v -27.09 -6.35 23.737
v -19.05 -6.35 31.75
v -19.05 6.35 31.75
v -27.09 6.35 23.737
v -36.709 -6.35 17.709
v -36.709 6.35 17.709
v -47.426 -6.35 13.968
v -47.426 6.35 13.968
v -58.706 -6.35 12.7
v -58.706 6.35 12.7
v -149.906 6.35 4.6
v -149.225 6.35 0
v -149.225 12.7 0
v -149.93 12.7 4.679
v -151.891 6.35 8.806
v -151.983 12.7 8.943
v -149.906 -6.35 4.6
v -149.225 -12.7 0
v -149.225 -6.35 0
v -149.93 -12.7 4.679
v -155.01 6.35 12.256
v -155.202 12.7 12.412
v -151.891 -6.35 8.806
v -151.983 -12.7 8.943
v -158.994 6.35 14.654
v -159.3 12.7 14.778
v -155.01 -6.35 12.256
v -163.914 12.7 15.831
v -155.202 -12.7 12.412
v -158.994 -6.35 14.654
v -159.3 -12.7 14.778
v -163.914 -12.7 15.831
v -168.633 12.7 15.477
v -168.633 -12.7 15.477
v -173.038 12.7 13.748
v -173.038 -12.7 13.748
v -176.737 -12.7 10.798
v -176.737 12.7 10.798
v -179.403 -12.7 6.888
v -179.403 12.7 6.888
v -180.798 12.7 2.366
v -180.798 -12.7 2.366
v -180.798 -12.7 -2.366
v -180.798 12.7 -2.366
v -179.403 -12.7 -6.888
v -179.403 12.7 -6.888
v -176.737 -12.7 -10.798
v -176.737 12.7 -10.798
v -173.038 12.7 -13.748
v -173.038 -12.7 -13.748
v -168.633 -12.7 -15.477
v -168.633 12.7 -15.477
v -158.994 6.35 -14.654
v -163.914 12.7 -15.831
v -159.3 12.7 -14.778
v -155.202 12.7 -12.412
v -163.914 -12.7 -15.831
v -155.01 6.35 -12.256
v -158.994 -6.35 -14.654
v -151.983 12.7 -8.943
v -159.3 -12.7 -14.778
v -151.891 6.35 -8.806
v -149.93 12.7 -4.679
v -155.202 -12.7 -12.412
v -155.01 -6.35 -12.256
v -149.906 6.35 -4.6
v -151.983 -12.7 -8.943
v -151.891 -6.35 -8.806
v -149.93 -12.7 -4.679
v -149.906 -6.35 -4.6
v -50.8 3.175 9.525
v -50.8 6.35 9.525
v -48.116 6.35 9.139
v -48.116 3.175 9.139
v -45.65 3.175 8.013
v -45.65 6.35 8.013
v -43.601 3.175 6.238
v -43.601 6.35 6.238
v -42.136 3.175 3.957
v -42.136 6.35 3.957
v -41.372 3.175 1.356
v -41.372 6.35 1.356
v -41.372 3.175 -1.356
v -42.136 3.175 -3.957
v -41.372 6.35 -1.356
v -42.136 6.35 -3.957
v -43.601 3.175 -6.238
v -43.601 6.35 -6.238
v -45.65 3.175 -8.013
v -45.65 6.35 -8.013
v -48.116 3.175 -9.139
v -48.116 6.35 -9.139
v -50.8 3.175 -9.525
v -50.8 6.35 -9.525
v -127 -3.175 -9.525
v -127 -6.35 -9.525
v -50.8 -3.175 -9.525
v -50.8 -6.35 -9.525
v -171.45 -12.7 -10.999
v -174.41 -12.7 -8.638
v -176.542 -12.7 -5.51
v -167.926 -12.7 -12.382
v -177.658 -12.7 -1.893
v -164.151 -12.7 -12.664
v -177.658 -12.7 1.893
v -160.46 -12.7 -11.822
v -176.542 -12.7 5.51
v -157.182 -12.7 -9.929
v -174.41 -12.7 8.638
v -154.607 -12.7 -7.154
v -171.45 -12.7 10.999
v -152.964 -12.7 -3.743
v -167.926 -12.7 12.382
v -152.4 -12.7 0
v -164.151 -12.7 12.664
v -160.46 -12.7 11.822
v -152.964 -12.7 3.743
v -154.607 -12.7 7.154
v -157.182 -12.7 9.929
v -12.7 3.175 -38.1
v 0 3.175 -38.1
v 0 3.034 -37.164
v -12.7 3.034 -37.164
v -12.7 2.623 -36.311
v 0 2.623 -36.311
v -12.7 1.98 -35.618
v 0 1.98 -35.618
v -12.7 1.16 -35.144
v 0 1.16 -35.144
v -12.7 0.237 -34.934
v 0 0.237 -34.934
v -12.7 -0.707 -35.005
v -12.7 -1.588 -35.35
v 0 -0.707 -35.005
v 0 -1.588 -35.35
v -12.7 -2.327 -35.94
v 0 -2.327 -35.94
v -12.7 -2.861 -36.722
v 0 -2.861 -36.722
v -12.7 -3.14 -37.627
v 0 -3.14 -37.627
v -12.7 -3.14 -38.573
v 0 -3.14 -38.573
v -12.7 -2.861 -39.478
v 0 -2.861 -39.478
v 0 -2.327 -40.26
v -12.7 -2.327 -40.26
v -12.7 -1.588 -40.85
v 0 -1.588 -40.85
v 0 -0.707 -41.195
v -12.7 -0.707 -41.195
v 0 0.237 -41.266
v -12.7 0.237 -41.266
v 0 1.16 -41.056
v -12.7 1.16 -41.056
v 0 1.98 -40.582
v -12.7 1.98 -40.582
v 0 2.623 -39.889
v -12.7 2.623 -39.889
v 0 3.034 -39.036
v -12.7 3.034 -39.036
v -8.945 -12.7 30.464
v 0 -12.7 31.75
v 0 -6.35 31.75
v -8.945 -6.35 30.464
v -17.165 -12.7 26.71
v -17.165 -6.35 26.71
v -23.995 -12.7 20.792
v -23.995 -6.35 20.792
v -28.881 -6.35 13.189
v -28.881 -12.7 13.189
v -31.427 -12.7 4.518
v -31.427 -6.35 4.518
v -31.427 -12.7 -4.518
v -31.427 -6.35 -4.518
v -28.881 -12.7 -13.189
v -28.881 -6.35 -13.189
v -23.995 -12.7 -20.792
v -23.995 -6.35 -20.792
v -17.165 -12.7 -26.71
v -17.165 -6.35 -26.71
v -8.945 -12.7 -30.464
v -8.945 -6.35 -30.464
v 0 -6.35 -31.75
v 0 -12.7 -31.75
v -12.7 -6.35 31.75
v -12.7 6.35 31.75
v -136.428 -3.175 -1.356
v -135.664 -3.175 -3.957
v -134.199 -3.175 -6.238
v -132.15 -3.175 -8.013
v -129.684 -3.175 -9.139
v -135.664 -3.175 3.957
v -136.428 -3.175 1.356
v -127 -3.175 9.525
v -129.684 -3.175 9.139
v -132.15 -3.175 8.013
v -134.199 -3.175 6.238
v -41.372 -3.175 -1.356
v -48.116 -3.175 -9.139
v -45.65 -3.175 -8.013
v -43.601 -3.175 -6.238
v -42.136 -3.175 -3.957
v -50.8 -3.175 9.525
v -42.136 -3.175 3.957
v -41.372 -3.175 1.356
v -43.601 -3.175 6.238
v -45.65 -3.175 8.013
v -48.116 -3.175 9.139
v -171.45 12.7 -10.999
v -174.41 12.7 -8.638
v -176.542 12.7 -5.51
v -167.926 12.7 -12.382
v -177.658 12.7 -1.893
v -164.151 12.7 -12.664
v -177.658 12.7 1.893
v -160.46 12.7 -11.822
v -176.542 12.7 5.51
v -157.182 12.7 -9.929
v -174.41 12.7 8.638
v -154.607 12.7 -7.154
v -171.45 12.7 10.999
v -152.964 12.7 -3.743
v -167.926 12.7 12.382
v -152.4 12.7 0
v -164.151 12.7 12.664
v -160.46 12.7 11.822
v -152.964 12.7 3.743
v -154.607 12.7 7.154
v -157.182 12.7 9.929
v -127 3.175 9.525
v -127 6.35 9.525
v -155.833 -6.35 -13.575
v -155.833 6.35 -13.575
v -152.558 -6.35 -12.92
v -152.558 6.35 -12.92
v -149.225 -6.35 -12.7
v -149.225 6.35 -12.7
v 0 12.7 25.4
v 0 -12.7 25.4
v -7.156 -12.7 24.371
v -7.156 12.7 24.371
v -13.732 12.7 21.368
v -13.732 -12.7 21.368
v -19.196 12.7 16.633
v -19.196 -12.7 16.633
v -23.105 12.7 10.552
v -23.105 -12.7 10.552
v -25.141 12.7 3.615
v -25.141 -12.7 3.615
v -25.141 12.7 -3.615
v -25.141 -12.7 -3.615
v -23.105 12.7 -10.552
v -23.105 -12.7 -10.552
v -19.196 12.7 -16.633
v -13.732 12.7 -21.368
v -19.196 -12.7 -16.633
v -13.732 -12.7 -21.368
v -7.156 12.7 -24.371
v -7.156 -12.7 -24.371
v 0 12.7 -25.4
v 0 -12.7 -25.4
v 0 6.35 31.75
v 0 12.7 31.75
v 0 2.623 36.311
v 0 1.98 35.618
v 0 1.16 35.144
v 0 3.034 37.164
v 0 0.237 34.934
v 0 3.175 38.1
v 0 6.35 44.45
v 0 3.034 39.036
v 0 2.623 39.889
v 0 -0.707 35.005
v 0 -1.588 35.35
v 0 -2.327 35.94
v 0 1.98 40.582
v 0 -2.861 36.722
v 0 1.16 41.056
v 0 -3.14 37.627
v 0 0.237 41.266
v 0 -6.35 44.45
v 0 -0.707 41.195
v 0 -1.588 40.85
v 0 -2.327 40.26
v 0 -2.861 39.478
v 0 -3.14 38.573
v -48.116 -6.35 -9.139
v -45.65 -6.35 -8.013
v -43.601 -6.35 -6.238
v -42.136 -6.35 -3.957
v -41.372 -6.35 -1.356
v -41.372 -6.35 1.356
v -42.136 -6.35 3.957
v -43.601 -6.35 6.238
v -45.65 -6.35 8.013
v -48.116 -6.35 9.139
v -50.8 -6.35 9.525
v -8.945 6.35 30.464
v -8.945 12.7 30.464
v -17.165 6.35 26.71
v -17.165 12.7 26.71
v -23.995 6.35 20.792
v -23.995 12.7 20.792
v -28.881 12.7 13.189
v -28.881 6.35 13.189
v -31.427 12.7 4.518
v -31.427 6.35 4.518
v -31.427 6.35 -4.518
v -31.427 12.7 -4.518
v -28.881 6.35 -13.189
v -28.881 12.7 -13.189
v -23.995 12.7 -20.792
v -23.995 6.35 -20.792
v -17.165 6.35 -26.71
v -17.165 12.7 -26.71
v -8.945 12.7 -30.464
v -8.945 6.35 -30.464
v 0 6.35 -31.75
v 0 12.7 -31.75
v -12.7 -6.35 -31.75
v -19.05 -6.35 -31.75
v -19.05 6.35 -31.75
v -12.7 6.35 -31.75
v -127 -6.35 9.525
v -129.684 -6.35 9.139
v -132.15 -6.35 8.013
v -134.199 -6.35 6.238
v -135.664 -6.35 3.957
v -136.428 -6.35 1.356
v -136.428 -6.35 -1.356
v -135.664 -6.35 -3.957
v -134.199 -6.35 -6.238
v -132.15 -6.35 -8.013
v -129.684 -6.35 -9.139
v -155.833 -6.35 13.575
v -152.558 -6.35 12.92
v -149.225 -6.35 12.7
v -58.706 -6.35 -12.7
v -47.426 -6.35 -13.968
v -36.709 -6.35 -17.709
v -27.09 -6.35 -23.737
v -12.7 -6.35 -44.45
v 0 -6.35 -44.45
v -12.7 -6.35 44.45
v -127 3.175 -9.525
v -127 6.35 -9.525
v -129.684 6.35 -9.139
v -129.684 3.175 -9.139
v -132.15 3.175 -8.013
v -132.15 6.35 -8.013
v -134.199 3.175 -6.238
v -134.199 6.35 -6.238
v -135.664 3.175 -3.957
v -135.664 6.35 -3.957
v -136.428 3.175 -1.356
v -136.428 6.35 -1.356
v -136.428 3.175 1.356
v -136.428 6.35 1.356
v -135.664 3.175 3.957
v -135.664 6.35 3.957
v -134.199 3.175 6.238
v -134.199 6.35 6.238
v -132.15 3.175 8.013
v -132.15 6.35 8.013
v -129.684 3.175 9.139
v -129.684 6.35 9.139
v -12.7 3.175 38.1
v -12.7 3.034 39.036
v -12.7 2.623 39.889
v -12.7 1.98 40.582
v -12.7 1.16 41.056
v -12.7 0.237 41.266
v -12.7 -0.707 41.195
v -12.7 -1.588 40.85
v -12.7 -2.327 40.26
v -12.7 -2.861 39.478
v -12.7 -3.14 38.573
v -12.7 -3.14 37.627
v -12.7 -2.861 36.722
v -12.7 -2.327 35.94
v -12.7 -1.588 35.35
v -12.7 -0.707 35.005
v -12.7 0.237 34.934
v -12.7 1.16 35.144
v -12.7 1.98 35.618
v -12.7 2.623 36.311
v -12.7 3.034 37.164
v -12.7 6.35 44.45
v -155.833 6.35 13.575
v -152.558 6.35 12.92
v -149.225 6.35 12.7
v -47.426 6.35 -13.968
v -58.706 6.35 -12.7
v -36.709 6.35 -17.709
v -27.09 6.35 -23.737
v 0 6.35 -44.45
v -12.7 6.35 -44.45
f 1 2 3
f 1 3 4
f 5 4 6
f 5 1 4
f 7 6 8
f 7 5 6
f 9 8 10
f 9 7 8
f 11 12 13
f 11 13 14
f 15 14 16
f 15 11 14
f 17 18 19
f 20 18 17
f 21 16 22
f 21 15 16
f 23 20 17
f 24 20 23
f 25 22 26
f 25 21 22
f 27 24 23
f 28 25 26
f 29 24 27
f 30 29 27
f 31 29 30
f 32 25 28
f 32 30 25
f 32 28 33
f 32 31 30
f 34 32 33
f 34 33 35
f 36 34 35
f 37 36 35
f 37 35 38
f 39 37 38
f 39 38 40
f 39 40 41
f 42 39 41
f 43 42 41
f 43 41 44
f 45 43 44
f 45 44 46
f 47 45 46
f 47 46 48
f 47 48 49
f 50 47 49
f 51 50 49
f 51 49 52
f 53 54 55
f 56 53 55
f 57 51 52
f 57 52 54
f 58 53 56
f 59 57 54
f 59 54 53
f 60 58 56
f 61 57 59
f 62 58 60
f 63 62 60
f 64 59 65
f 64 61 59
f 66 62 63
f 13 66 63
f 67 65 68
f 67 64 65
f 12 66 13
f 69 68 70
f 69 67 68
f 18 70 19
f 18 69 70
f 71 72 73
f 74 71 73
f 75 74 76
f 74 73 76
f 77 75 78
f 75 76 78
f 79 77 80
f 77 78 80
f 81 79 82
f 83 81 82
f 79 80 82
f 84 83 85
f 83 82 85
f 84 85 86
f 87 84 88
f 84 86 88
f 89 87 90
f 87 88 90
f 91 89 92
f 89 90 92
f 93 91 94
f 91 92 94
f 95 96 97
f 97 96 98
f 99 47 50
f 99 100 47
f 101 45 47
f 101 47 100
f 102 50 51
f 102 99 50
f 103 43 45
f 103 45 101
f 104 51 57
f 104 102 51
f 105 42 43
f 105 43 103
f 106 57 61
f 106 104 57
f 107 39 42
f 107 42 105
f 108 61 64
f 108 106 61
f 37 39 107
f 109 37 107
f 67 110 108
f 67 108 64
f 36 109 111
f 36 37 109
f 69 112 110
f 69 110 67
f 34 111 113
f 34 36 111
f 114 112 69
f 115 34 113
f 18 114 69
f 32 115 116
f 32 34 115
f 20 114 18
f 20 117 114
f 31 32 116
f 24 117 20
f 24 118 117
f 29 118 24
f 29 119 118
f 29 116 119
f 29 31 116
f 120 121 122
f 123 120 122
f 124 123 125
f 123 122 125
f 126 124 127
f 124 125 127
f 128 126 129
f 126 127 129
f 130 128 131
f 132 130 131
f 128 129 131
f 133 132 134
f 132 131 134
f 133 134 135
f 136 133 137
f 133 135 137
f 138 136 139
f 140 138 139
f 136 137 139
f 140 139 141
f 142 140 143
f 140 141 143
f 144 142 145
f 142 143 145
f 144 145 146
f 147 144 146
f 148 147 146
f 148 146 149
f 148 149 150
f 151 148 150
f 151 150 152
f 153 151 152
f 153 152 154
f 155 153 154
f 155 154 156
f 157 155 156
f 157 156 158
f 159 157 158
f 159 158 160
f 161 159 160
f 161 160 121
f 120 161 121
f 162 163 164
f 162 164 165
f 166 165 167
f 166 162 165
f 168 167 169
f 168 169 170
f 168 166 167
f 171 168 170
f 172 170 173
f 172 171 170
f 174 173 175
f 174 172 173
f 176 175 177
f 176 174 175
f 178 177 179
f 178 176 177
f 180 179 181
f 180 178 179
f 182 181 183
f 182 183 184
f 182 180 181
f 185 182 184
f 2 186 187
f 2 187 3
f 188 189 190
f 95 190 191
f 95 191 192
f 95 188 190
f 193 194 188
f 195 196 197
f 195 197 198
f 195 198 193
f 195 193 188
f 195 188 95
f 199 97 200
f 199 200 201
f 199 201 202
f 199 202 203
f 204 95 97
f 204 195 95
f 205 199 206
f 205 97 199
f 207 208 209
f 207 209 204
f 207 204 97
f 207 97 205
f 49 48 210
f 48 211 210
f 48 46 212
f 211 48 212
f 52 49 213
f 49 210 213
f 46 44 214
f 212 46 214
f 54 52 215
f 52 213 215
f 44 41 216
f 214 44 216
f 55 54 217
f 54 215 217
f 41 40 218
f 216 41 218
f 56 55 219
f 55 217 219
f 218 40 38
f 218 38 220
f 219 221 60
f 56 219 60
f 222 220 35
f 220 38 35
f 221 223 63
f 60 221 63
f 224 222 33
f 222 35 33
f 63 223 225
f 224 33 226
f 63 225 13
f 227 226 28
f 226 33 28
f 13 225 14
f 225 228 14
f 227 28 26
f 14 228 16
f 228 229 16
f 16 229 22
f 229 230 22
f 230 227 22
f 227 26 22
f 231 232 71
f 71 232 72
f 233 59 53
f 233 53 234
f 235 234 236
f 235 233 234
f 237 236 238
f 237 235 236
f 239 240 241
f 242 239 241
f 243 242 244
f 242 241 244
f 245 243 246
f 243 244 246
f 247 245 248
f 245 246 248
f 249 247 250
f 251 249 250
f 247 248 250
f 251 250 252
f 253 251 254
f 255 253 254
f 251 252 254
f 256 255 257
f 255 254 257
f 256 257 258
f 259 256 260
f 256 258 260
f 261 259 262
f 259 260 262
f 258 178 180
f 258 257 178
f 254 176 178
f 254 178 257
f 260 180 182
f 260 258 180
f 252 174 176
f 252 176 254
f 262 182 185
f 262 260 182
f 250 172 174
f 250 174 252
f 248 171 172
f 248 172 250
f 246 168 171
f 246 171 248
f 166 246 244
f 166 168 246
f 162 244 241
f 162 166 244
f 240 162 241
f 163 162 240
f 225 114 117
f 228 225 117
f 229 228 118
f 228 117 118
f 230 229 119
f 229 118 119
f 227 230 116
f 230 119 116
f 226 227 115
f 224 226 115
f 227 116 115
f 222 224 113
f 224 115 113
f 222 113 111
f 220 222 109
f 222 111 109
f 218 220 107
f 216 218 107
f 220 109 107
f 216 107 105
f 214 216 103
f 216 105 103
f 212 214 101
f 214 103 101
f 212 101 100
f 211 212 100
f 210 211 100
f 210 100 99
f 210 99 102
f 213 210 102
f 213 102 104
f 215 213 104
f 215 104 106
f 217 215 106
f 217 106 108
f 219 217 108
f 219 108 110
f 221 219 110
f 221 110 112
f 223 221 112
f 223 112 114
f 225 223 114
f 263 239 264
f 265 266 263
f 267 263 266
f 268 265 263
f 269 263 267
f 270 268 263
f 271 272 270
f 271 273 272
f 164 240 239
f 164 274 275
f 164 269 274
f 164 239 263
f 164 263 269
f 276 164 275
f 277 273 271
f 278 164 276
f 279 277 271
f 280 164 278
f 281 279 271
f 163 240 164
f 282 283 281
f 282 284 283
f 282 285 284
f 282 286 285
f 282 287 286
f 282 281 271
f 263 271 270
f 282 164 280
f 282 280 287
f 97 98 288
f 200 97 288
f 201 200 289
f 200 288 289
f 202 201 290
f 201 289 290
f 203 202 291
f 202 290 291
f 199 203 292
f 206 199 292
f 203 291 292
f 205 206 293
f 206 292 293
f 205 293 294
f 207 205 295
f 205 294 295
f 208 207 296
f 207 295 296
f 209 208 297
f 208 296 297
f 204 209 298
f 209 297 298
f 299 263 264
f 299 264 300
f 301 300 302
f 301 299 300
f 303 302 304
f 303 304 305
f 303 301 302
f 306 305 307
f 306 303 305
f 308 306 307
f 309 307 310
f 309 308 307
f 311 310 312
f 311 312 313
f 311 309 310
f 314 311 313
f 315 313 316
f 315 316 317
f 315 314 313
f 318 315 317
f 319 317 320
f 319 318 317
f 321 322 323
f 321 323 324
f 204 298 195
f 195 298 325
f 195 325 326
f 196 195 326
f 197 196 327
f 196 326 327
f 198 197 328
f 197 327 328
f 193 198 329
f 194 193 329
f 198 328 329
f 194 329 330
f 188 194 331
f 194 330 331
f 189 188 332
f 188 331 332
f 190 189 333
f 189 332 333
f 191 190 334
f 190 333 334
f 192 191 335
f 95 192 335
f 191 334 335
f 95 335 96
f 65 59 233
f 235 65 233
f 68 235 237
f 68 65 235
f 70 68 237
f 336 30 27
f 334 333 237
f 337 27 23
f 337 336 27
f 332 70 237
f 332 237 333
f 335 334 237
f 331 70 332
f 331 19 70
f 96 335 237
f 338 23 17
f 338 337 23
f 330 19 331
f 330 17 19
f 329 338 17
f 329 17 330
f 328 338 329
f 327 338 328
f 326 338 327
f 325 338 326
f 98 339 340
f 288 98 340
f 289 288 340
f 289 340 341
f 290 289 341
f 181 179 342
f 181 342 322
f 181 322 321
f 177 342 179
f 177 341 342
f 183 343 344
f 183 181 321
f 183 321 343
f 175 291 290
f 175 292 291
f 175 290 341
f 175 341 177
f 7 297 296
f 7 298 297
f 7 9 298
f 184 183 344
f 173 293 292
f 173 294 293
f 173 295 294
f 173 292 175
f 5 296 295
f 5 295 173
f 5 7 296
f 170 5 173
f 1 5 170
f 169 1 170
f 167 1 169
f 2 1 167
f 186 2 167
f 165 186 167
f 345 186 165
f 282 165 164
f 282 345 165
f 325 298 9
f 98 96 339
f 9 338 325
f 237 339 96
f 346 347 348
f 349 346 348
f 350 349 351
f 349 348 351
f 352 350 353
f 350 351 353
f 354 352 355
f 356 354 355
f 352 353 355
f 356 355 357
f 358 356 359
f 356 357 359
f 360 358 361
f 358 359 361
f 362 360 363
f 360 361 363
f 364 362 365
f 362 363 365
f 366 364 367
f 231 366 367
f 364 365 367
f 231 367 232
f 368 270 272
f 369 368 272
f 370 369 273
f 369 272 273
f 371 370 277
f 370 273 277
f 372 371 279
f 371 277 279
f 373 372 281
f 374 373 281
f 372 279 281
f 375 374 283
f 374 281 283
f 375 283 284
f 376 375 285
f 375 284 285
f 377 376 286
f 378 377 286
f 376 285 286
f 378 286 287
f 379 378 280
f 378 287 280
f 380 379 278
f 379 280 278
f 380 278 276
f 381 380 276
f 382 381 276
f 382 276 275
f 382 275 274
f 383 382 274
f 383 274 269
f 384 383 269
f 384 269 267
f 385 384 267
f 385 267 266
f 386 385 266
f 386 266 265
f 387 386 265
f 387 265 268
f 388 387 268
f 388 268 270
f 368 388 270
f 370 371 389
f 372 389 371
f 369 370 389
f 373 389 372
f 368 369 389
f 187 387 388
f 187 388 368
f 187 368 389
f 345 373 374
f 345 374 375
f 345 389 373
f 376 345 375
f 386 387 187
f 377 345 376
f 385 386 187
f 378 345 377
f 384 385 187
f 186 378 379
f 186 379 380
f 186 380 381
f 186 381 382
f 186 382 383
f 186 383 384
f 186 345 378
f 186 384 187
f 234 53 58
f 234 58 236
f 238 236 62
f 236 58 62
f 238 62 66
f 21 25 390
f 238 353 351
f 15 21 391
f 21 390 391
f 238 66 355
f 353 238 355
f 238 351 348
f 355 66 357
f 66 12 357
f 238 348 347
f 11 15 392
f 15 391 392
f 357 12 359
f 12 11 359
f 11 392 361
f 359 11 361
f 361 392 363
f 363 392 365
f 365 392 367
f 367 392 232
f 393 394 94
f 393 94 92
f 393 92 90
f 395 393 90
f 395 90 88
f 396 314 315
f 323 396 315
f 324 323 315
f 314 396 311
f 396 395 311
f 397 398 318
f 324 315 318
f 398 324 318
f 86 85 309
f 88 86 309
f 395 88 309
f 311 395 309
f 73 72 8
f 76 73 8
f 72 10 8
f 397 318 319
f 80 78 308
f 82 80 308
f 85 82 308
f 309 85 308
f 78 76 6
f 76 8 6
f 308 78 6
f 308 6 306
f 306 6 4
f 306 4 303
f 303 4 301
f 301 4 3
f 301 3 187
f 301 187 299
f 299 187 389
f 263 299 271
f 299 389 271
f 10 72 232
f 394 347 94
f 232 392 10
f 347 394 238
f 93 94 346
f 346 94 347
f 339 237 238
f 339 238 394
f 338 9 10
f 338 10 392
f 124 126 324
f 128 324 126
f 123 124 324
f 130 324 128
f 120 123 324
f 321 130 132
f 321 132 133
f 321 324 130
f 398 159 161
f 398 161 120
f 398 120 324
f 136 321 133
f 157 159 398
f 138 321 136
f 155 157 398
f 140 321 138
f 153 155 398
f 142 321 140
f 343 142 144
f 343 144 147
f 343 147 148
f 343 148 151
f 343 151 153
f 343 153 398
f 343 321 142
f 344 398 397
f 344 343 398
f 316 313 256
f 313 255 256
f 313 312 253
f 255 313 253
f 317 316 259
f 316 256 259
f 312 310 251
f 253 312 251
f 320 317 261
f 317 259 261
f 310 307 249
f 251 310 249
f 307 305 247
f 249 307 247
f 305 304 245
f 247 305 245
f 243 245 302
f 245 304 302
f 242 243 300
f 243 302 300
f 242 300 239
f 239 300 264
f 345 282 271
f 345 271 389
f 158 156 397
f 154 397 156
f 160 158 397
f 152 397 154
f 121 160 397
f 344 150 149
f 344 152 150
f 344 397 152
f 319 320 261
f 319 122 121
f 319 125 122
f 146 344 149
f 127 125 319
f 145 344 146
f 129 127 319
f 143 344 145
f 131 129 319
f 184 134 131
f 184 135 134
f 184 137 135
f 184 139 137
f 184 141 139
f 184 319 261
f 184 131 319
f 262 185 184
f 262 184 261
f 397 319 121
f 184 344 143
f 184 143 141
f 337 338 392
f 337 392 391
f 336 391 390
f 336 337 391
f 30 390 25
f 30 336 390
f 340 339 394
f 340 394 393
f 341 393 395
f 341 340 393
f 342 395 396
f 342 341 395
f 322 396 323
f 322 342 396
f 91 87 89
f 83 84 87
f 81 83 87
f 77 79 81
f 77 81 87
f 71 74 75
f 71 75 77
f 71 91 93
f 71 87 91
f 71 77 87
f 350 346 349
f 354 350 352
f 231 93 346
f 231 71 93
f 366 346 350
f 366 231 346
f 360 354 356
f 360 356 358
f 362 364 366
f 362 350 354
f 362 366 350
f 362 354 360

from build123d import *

# Parameters (mm, degrees)
F1_DEPTH  = 6.35
F3_DEPTH  = 3.175
F5_DEPTH  = 3.175
F6_R      = 15.875
F7_DEPTH  = 12.7
F9_DEPTH  = 12.7
F11_DEPTH = 25.401
F12_R     = 12.7
F13_DEPTH = 25.401
F14_R     = 3.175
F15_DEPTH = 180.976


with BuildPart() as f1:
    # F0 (on Front) → F1 (new body, symmetric)
    with BuildSketch(Plane.XZ):
        with BuildLine():
            ThreePointArc((0, -25.4), (-25.4, 0), (0, 25.4))
            Line((0, 25.4), (0, 44.45))
            Line((0, 44.45), (-12.7, 44.45))
            Line((-12.7, 44.45), (-12.7, 31.75))
            Line((-12.7, 31.75), (-19.05, 31.75))
            ThreePointArc((-19.05, 31.75), (-36.7086920337, 17.7094988016), (-58.7057372898, 12.7))
            Line((-58.7057372898, 12.7), (-149.225, 12.7))
            ThreePointArc((-149.225, 12.7), (-154.2063498325, 13.1932508375), (-158.9942307692, 14.6538461538))
            ThreePointArc((-158.9942307692, 14.6538461538), (-180.975, 0), (-158.9942307692, -14.6538461538))
            ThreePointArc((-158.9942307692, -14.6538461538), (-154.2063498325, -13.1932508375), (-149.225, -12.7))
            Line((-149.225, -12.7), (-58.7057372898, -12.7))
            ThreePointArc((-58.7057372898, -12.7), (-36.7086920337, -17.7094988016), (-19.05, -31.75))
            Line((-19.05, -31.75), (-12.7, -31.75))
            Line((-12.7, -31.75), (-12.7, -44.45))
            Line((-12.7, -44.45), (0, -44.45))
            Line((0, -44.45), (0, -25.4))
        make_face()
    extrude(amount=F1_DEPTH, both=True)

    # F2 (on face) → F3 (cut)
    with BuildSketch(Plane.XZ.offset(6.35)):
        with BuildLine():
            ThreePointArc((-127, 9.525), (-136.525, 0), (-127, -9.525))
            Line((-127, -9.525), (-50.8, -9.525))
            ThreePointArc((-50.8, -9.525), (-41.275, 0), (-50.8, 9.525))
            Line((-50.8, 9.525), (-127, 9.525))
        make_face()
    extrude(amount=-F3_DEPTH, mode=Mode.SUBTRACT)

    # F4 (on face) → F5 (cut)
    with BuildSketch(Plane(origin=(0, 6.35, 0), x_dir=(-1, 0, 0), z_dir=(0, 1, 0))):
        with BuildLine():
            ThreePointArc((50.8, 9.525), (41.275, 0), (50.8, -9.525))
            Line((50.8, -9.525), (127, -9.525))
            ThreePointArc((127, -9.525), (136.525, 0), (127, 9.525))
            Line((127, 9.525), (50.8, 9.525))
        make_face()
    extrude(amount=-F5_DEPTH, mode=Mode.SUBTRACT)

    # F6 (on Front) → F7 (join, symmetric)
    with BuildSketch(Plane.XZ):
        with Locations((-165.1, 0)):
            Circle(F6_R)
    extrude(amount=F7_DEPTH, both=True)

    # F8 (on Front) → F9 (join, symmetric)
    with BuildSketch(Plane.XZ):
        with BuildLine():
            Line((0, -31.75), (0, 31.75))
            ThreePointArc((0, 31.75), (-31.75, 0), (0, -31.75))
        make_face()
    extrude(amount=F9_DEPTH, both=True)

    # F10 (on face) → F11 (cut, through all)
    with BuildSketch(Plane.XZ.offset(12.7)):
        with BuildLine():
            Line((0, -25.4), (0, 25.4))
            ThreePointArc((0, 25.4), (-25.4, 0), (0, -25.4))
        make_face()
    extrude(amount=-F11_DEPTH, mode=Mode.SUBTRACT)

    # F12 (on face) → F13 (cut, through all)
    with BuildSketch(Plane.XZ.offset(12.7)):
        with Locations((-165.1, 0)):
            Circle(F12_R)
    extrude(amount=-F13_DEPTH, mode=Mode.SUBTRACT)

    # F14 (on Right) → F15 (cut, through all)
    with BuildSketch(Plane.YZ):
        with Locations((0, 38.1)):
            Circle(F14_R)
        with Locations((0, -38.1)):
            Circle(F14_R)
    extrude(amount=-F15_DEPTH, mode=Mode.SUBTRACT)


solid = f1.part
